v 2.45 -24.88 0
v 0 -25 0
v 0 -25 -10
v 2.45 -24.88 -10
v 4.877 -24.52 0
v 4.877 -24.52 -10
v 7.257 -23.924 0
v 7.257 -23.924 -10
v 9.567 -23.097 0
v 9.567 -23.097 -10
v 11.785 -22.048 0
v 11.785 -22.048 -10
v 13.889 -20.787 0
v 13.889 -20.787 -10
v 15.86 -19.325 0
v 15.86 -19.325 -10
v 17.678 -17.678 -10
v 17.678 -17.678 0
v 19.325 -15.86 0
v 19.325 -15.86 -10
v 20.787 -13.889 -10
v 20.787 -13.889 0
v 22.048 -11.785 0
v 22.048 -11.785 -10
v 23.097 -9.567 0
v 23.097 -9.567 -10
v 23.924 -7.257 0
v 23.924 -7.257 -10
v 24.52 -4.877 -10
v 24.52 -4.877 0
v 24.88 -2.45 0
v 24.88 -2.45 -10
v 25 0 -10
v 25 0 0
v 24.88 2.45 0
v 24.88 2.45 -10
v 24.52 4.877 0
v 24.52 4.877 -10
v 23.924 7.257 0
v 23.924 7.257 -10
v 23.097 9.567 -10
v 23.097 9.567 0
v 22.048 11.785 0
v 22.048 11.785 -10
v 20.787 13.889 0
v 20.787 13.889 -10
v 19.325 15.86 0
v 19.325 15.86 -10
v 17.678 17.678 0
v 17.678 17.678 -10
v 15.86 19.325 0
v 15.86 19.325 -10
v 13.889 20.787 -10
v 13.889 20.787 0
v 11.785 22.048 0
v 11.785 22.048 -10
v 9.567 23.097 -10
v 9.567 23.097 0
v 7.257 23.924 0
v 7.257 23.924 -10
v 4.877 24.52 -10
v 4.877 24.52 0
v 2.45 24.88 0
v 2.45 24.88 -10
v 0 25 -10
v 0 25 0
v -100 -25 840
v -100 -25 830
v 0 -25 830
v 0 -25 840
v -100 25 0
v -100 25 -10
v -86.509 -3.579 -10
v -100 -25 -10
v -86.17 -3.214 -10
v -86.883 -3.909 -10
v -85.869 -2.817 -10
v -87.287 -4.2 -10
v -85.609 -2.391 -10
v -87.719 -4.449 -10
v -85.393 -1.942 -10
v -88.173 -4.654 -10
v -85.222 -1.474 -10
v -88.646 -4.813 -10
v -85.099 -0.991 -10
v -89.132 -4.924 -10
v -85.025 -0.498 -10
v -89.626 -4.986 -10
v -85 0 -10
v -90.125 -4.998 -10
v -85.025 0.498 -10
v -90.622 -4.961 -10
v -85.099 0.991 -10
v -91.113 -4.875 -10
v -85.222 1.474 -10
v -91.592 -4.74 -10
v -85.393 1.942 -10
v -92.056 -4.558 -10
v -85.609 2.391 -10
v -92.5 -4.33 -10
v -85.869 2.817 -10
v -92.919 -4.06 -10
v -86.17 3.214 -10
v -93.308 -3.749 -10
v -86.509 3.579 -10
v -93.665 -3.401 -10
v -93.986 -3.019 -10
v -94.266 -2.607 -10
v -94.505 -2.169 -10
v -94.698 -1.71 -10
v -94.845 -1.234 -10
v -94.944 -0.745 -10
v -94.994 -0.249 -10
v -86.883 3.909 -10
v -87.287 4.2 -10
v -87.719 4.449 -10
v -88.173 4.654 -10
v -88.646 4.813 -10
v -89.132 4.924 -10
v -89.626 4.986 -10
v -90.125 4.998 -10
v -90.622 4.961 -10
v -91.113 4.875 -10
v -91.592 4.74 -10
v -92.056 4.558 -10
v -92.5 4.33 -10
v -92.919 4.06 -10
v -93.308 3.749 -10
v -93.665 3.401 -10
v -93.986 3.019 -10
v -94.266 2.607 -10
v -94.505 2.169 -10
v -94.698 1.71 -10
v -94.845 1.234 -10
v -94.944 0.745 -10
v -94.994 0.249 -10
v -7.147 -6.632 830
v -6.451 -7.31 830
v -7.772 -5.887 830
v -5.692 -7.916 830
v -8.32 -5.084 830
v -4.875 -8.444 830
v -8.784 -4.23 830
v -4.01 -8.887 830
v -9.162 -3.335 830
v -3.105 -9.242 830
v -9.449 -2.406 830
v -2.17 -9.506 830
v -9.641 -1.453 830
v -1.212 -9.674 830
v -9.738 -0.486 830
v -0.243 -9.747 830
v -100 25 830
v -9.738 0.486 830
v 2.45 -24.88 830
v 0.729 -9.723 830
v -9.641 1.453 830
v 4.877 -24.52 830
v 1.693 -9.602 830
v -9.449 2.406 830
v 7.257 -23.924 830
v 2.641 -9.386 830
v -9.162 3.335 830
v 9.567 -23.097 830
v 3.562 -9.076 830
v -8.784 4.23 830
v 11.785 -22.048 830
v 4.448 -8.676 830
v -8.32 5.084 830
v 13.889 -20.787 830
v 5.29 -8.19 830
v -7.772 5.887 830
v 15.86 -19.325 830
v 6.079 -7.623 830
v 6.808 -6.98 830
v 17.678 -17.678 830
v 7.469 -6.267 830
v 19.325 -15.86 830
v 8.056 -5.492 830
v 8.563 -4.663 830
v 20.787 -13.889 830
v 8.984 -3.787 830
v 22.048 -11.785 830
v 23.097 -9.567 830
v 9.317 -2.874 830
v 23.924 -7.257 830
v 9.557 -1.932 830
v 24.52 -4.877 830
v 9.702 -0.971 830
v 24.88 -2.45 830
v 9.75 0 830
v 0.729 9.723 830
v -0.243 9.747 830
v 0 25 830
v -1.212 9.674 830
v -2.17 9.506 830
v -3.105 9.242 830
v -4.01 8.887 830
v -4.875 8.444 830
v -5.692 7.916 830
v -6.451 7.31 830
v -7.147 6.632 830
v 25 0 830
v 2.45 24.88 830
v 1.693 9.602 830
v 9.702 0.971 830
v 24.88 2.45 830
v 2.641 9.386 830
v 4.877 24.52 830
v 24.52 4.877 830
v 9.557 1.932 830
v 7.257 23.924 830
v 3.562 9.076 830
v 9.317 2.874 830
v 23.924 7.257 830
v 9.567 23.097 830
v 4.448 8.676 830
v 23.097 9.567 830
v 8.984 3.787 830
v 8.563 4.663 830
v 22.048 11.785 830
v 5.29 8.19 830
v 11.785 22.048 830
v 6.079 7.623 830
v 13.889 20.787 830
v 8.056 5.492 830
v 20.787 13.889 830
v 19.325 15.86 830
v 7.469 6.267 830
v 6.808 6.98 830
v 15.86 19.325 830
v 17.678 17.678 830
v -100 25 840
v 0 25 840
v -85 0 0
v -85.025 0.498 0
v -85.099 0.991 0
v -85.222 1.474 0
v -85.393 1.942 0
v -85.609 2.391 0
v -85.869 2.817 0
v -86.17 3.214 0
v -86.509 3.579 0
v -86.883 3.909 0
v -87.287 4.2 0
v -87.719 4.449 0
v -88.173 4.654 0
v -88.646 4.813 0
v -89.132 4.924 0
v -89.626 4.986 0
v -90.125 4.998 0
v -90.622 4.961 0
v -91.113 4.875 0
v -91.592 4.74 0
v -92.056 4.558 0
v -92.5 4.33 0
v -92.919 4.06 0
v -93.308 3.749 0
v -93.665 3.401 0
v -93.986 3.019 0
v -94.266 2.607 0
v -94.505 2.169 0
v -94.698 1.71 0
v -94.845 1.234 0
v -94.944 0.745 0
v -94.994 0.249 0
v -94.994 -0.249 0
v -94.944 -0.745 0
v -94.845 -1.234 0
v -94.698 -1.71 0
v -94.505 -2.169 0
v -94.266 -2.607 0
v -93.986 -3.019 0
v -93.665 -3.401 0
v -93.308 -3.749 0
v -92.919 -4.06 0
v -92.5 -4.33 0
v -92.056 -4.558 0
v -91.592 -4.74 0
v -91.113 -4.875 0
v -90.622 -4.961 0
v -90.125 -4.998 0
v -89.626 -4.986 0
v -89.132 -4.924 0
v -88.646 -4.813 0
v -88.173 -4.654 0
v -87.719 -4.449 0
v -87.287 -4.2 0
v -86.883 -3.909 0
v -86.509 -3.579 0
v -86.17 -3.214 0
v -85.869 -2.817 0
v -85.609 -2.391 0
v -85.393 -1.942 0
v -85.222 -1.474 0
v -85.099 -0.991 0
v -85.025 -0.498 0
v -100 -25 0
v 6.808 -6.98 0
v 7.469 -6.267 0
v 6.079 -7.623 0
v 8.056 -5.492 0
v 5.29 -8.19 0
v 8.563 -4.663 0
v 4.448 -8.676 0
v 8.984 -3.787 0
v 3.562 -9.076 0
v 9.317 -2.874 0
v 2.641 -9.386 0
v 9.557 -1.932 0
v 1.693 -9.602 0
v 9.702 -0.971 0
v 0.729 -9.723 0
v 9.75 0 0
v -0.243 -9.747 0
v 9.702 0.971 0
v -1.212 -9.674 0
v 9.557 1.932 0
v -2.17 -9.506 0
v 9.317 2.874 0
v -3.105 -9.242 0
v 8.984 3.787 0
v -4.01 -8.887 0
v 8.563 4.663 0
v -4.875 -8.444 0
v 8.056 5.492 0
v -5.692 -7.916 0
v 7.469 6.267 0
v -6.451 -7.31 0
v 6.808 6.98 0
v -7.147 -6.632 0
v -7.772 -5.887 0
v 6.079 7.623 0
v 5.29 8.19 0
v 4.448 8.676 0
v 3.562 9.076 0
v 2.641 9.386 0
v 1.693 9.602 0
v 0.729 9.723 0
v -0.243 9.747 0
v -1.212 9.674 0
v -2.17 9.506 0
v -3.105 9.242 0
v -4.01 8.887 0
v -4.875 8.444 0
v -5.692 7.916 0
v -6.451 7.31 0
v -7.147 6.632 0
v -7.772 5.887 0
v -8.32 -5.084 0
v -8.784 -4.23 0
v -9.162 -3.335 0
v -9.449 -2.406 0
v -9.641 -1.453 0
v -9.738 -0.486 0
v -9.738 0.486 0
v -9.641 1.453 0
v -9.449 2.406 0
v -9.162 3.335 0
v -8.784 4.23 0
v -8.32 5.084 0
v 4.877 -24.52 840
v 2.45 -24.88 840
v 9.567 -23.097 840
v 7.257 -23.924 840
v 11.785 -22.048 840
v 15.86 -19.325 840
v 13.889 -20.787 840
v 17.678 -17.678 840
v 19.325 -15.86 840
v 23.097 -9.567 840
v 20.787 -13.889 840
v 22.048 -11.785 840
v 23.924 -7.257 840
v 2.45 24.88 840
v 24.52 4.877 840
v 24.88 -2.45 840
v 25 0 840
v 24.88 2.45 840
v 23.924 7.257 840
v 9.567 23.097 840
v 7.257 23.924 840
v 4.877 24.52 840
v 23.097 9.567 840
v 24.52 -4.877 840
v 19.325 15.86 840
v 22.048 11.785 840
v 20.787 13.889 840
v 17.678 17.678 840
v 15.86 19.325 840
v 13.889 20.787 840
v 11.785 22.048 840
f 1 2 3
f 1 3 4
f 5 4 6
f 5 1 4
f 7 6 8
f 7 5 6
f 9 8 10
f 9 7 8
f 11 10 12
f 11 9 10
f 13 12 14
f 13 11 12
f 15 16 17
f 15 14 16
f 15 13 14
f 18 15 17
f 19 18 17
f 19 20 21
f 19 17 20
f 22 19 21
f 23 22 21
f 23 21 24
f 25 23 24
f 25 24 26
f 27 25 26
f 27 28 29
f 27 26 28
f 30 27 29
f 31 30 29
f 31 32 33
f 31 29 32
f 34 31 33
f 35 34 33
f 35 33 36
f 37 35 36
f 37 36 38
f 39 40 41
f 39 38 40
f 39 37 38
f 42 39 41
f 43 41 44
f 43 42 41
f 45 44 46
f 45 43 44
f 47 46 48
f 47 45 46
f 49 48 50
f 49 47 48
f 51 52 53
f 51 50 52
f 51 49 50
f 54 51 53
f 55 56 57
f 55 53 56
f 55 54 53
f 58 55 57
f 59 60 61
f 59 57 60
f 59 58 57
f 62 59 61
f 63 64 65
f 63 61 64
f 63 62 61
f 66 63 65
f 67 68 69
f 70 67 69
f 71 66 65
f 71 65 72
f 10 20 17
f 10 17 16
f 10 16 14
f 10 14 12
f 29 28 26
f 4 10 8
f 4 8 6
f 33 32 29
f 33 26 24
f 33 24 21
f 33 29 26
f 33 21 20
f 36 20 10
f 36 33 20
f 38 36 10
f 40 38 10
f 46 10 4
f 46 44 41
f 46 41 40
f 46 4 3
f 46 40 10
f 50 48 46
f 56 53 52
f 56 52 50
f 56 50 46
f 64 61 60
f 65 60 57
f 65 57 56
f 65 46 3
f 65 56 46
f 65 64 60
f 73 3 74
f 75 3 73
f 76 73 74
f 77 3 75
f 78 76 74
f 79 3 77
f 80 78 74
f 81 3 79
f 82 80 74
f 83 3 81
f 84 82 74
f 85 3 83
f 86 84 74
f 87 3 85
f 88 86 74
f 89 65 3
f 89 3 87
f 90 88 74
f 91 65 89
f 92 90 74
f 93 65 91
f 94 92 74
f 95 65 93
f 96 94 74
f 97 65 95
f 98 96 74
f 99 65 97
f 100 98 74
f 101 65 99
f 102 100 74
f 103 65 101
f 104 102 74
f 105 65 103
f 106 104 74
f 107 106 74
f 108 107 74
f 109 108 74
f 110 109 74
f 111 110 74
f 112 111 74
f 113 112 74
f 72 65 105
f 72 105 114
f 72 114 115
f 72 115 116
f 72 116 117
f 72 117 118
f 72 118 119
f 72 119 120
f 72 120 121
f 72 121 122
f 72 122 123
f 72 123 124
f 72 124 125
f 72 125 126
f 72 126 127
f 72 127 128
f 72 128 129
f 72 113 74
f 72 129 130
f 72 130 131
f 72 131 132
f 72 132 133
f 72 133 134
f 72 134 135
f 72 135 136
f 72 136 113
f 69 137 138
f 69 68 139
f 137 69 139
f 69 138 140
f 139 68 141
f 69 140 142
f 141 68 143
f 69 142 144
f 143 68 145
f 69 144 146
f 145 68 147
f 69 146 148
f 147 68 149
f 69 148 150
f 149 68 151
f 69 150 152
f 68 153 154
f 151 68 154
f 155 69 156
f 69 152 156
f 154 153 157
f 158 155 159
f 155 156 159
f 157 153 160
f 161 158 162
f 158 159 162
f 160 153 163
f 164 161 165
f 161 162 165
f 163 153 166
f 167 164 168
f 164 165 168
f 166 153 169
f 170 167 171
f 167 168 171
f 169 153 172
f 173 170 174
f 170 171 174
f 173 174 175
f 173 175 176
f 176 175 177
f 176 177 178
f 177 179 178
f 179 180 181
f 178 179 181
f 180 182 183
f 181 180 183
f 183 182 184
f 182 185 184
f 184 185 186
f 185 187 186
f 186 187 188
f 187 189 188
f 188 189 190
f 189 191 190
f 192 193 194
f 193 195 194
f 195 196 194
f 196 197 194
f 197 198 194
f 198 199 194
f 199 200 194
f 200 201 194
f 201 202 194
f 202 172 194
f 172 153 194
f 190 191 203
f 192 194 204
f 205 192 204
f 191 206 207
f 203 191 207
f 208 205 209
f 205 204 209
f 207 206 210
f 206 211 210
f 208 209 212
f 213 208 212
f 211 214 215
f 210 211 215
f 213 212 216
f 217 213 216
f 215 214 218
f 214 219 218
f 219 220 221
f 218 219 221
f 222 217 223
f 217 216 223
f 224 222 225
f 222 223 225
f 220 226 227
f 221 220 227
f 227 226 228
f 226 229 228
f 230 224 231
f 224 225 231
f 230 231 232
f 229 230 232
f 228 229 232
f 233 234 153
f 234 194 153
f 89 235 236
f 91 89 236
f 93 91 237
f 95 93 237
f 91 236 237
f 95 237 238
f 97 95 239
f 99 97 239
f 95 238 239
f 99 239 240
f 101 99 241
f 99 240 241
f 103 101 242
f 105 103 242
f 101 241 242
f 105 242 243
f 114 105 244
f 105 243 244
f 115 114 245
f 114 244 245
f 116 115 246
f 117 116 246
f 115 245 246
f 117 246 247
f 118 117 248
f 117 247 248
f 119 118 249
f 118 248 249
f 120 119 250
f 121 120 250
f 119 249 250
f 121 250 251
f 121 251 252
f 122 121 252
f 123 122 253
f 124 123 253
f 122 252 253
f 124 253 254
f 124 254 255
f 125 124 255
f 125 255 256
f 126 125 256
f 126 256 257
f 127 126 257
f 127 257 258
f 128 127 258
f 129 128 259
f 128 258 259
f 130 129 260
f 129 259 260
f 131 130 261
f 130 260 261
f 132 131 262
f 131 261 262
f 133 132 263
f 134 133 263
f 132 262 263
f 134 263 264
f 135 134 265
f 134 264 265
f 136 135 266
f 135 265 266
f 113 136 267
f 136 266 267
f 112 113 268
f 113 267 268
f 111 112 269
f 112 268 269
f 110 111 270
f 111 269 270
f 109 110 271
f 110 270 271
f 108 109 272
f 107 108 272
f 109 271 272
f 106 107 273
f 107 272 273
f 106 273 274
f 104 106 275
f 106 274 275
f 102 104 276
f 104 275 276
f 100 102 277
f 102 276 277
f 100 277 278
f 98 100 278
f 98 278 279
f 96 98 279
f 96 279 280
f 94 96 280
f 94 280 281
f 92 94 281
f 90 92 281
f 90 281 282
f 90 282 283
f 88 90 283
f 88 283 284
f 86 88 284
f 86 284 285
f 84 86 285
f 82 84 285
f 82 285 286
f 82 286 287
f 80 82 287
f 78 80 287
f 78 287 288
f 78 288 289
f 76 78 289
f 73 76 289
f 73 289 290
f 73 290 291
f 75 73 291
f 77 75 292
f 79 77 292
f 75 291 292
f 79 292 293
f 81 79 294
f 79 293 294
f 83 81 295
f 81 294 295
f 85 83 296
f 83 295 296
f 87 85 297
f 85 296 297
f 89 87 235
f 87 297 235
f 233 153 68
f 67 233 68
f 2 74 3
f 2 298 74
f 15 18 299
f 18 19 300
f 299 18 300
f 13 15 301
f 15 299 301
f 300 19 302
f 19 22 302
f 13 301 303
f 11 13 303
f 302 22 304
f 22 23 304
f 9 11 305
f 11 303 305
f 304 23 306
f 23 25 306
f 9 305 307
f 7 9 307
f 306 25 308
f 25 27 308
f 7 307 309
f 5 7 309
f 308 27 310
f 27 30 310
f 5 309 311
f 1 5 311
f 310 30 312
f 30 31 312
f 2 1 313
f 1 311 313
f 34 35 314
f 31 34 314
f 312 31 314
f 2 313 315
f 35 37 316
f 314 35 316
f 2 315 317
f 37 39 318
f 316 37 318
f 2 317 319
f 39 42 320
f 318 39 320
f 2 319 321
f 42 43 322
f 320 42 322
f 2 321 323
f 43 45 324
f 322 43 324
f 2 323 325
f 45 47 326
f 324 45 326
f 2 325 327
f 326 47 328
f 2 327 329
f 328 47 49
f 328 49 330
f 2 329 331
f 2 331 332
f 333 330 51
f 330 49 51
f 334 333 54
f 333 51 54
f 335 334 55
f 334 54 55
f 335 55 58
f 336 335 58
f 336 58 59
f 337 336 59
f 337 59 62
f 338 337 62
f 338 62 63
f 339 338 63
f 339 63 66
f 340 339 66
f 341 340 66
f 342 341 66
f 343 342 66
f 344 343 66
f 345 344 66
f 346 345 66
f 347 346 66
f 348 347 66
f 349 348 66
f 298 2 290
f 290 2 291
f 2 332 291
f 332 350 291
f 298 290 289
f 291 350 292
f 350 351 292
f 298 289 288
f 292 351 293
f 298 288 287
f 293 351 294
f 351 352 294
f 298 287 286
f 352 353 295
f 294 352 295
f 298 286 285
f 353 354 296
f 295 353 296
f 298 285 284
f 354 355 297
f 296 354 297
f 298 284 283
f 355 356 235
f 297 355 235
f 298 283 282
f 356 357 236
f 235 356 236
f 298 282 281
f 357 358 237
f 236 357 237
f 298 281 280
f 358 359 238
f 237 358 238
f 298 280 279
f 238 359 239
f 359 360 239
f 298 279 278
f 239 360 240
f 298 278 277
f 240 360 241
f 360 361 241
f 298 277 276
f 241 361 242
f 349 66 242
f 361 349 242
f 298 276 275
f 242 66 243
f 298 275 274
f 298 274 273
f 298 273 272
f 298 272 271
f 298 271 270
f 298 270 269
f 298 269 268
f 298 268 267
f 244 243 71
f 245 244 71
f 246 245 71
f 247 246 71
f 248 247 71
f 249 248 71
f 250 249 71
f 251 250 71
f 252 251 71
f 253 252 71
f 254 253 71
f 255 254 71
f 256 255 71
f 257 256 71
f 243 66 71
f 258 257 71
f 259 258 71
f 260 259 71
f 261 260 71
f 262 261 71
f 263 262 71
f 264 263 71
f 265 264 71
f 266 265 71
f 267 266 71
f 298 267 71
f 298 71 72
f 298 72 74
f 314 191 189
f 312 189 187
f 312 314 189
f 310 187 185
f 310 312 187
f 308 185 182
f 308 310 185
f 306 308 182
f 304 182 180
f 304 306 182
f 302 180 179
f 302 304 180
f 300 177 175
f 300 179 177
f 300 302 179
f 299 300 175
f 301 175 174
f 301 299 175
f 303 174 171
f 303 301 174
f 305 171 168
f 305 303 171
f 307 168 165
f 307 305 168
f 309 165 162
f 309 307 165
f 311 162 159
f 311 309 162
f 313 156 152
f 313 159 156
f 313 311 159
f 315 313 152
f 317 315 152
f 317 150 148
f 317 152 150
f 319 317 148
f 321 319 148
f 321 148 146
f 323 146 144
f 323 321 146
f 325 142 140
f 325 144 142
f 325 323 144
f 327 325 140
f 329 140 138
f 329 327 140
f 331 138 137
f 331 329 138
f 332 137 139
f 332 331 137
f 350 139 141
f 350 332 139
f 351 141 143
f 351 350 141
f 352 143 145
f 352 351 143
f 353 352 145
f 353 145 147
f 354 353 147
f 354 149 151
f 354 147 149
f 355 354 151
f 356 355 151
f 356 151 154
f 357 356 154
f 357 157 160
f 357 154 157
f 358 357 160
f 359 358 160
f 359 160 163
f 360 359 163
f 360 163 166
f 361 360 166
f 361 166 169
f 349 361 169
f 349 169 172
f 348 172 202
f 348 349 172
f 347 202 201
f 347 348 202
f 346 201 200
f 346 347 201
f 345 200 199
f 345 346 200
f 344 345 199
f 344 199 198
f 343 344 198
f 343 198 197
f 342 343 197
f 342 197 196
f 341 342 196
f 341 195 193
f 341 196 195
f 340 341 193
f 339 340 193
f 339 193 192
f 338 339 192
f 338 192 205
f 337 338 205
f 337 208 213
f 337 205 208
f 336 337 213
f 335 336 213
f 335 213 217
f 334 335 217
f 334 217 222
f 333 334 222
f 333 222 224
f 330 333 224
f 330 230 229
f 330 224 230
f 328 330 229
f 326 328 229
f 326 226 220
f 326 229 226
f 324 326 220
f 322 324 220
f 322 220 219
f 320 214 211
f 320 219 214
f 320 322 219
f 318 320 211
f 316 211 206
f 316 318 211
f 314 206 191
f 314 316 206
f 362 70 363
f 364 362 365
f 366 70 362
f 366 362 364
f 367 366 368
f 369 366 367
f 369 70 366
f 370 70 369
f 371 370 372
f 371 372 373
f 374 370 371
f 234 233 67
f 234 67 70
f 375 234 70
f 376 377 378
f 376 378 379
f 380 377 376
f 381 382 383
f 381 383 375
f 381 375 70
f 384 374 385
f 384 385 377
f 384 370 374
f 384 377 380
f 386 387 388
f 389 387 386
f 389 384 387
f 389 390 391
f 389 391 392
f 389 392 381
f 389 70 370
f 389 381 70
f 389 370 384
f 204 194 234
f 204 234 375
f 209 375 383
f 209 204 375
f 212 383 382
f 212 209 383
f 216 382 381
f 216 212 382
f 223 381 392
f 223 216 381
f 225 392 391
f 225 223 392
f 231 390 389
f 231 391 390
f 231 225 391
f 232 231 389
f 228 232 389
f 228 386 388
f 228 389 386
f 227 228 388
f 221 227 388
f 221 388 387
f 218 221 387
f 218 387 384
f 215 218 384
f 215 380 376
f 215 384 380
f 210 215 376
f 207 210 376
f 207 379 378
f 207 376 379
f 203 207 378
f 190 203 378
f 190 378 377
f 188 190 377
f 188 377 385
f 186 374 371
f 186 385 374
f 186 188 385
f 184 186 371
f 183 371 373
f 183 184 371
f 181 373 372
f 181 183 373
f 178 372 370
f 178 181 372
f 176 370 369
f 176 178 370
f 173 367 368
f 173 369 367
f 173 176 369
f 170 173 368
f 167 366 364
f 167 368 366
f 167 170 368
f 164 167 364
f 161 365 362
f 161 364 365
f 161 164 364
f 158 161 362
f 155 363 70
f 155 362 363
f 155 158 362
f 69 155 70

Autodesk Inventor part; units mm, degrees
ref_plane "YZ Plane" through (0, 0, 0) normal (1, 0, 0) x (0, 1, 0)
ref_plane "XZ Plane" through (0, 0, 0) normal (0, 1, 0) x (-1, 0, 0)
ref_plane "XY Plane" through (0, 0, 0) normal (0, 0, 1) x (1, 0, 0)
sketch "Skizze1" plane through (0, 0, 0) normal (0, 0, 1) x (1, 0, 0)
  circle A0 centre (0, 0) radius 9.75
  dimension "d0" = 19.5
extrude "Extrusion1" add sketch "Skizze1" along normal blind 830
sketch "Skizze4" plane through (0, 0, 830) normal (0, 0, 1) x (1, 0, 0)
  arc A0 (0, -25) -> (0, 25) centre (0, 0) ccw
  line L0 (0, 0) -> (0, -25) construction
  line L1 (0, 0) -> (0, 27.5151) construction
  line L2 (0, 25) -> (-100, 25)
  line L3 (-100, 25) -> (-100, -25)
  line L4 (-100, -25) -> (0, -25)
  point P0 (0, 25)
  dimension "d9" = 180
  dimension "d10" = 100
  dimension "d11" = 50
  dimension "d12" = 25
extrude "Extrusion4" add sketch "Skizze4" along normal blind 10
sketch "Skizze5" plane through (0, 0, 0) normal (0, 0, -1) x (-1, 0, 0)
  arc A0 (0, 25) -> (0, -25) centre (0, 0) ccw
  line L0 (0, 25) -> (100, 25)
  line L1 (100, 25) -> (100, -25)
  line L2 (100, -25) -> (0, -25)
  dimension "d15" = 25
  dimension "d16" = 0
  dimension "d17" = 0
  dimension "d18" = 100
  dimension "d19" = 50
  dimension "d20" = 90
extrude "Extrusion5" add sketch "Skizze5" along normal blind 10
sketch "Skizze6" plane through (0, 0, 0) normal (0, 0, 1) x (1, 0, 0)
  circle A0 centre (-90, 0) radius 5
  line L0 (-100, 25) -> (0, 25) projected
  line L1 (-100, -25) -> (-100, 25) projected
  point P0 (0, 0)
  dimension "d23" = 10
  dimension "d24" = 25
  dimension "d25" = 10
extrude "Extrusion6" cut sketch "Skizze6" against normal up to surface (10 mm away)
properties part number "LenkungHinten"
